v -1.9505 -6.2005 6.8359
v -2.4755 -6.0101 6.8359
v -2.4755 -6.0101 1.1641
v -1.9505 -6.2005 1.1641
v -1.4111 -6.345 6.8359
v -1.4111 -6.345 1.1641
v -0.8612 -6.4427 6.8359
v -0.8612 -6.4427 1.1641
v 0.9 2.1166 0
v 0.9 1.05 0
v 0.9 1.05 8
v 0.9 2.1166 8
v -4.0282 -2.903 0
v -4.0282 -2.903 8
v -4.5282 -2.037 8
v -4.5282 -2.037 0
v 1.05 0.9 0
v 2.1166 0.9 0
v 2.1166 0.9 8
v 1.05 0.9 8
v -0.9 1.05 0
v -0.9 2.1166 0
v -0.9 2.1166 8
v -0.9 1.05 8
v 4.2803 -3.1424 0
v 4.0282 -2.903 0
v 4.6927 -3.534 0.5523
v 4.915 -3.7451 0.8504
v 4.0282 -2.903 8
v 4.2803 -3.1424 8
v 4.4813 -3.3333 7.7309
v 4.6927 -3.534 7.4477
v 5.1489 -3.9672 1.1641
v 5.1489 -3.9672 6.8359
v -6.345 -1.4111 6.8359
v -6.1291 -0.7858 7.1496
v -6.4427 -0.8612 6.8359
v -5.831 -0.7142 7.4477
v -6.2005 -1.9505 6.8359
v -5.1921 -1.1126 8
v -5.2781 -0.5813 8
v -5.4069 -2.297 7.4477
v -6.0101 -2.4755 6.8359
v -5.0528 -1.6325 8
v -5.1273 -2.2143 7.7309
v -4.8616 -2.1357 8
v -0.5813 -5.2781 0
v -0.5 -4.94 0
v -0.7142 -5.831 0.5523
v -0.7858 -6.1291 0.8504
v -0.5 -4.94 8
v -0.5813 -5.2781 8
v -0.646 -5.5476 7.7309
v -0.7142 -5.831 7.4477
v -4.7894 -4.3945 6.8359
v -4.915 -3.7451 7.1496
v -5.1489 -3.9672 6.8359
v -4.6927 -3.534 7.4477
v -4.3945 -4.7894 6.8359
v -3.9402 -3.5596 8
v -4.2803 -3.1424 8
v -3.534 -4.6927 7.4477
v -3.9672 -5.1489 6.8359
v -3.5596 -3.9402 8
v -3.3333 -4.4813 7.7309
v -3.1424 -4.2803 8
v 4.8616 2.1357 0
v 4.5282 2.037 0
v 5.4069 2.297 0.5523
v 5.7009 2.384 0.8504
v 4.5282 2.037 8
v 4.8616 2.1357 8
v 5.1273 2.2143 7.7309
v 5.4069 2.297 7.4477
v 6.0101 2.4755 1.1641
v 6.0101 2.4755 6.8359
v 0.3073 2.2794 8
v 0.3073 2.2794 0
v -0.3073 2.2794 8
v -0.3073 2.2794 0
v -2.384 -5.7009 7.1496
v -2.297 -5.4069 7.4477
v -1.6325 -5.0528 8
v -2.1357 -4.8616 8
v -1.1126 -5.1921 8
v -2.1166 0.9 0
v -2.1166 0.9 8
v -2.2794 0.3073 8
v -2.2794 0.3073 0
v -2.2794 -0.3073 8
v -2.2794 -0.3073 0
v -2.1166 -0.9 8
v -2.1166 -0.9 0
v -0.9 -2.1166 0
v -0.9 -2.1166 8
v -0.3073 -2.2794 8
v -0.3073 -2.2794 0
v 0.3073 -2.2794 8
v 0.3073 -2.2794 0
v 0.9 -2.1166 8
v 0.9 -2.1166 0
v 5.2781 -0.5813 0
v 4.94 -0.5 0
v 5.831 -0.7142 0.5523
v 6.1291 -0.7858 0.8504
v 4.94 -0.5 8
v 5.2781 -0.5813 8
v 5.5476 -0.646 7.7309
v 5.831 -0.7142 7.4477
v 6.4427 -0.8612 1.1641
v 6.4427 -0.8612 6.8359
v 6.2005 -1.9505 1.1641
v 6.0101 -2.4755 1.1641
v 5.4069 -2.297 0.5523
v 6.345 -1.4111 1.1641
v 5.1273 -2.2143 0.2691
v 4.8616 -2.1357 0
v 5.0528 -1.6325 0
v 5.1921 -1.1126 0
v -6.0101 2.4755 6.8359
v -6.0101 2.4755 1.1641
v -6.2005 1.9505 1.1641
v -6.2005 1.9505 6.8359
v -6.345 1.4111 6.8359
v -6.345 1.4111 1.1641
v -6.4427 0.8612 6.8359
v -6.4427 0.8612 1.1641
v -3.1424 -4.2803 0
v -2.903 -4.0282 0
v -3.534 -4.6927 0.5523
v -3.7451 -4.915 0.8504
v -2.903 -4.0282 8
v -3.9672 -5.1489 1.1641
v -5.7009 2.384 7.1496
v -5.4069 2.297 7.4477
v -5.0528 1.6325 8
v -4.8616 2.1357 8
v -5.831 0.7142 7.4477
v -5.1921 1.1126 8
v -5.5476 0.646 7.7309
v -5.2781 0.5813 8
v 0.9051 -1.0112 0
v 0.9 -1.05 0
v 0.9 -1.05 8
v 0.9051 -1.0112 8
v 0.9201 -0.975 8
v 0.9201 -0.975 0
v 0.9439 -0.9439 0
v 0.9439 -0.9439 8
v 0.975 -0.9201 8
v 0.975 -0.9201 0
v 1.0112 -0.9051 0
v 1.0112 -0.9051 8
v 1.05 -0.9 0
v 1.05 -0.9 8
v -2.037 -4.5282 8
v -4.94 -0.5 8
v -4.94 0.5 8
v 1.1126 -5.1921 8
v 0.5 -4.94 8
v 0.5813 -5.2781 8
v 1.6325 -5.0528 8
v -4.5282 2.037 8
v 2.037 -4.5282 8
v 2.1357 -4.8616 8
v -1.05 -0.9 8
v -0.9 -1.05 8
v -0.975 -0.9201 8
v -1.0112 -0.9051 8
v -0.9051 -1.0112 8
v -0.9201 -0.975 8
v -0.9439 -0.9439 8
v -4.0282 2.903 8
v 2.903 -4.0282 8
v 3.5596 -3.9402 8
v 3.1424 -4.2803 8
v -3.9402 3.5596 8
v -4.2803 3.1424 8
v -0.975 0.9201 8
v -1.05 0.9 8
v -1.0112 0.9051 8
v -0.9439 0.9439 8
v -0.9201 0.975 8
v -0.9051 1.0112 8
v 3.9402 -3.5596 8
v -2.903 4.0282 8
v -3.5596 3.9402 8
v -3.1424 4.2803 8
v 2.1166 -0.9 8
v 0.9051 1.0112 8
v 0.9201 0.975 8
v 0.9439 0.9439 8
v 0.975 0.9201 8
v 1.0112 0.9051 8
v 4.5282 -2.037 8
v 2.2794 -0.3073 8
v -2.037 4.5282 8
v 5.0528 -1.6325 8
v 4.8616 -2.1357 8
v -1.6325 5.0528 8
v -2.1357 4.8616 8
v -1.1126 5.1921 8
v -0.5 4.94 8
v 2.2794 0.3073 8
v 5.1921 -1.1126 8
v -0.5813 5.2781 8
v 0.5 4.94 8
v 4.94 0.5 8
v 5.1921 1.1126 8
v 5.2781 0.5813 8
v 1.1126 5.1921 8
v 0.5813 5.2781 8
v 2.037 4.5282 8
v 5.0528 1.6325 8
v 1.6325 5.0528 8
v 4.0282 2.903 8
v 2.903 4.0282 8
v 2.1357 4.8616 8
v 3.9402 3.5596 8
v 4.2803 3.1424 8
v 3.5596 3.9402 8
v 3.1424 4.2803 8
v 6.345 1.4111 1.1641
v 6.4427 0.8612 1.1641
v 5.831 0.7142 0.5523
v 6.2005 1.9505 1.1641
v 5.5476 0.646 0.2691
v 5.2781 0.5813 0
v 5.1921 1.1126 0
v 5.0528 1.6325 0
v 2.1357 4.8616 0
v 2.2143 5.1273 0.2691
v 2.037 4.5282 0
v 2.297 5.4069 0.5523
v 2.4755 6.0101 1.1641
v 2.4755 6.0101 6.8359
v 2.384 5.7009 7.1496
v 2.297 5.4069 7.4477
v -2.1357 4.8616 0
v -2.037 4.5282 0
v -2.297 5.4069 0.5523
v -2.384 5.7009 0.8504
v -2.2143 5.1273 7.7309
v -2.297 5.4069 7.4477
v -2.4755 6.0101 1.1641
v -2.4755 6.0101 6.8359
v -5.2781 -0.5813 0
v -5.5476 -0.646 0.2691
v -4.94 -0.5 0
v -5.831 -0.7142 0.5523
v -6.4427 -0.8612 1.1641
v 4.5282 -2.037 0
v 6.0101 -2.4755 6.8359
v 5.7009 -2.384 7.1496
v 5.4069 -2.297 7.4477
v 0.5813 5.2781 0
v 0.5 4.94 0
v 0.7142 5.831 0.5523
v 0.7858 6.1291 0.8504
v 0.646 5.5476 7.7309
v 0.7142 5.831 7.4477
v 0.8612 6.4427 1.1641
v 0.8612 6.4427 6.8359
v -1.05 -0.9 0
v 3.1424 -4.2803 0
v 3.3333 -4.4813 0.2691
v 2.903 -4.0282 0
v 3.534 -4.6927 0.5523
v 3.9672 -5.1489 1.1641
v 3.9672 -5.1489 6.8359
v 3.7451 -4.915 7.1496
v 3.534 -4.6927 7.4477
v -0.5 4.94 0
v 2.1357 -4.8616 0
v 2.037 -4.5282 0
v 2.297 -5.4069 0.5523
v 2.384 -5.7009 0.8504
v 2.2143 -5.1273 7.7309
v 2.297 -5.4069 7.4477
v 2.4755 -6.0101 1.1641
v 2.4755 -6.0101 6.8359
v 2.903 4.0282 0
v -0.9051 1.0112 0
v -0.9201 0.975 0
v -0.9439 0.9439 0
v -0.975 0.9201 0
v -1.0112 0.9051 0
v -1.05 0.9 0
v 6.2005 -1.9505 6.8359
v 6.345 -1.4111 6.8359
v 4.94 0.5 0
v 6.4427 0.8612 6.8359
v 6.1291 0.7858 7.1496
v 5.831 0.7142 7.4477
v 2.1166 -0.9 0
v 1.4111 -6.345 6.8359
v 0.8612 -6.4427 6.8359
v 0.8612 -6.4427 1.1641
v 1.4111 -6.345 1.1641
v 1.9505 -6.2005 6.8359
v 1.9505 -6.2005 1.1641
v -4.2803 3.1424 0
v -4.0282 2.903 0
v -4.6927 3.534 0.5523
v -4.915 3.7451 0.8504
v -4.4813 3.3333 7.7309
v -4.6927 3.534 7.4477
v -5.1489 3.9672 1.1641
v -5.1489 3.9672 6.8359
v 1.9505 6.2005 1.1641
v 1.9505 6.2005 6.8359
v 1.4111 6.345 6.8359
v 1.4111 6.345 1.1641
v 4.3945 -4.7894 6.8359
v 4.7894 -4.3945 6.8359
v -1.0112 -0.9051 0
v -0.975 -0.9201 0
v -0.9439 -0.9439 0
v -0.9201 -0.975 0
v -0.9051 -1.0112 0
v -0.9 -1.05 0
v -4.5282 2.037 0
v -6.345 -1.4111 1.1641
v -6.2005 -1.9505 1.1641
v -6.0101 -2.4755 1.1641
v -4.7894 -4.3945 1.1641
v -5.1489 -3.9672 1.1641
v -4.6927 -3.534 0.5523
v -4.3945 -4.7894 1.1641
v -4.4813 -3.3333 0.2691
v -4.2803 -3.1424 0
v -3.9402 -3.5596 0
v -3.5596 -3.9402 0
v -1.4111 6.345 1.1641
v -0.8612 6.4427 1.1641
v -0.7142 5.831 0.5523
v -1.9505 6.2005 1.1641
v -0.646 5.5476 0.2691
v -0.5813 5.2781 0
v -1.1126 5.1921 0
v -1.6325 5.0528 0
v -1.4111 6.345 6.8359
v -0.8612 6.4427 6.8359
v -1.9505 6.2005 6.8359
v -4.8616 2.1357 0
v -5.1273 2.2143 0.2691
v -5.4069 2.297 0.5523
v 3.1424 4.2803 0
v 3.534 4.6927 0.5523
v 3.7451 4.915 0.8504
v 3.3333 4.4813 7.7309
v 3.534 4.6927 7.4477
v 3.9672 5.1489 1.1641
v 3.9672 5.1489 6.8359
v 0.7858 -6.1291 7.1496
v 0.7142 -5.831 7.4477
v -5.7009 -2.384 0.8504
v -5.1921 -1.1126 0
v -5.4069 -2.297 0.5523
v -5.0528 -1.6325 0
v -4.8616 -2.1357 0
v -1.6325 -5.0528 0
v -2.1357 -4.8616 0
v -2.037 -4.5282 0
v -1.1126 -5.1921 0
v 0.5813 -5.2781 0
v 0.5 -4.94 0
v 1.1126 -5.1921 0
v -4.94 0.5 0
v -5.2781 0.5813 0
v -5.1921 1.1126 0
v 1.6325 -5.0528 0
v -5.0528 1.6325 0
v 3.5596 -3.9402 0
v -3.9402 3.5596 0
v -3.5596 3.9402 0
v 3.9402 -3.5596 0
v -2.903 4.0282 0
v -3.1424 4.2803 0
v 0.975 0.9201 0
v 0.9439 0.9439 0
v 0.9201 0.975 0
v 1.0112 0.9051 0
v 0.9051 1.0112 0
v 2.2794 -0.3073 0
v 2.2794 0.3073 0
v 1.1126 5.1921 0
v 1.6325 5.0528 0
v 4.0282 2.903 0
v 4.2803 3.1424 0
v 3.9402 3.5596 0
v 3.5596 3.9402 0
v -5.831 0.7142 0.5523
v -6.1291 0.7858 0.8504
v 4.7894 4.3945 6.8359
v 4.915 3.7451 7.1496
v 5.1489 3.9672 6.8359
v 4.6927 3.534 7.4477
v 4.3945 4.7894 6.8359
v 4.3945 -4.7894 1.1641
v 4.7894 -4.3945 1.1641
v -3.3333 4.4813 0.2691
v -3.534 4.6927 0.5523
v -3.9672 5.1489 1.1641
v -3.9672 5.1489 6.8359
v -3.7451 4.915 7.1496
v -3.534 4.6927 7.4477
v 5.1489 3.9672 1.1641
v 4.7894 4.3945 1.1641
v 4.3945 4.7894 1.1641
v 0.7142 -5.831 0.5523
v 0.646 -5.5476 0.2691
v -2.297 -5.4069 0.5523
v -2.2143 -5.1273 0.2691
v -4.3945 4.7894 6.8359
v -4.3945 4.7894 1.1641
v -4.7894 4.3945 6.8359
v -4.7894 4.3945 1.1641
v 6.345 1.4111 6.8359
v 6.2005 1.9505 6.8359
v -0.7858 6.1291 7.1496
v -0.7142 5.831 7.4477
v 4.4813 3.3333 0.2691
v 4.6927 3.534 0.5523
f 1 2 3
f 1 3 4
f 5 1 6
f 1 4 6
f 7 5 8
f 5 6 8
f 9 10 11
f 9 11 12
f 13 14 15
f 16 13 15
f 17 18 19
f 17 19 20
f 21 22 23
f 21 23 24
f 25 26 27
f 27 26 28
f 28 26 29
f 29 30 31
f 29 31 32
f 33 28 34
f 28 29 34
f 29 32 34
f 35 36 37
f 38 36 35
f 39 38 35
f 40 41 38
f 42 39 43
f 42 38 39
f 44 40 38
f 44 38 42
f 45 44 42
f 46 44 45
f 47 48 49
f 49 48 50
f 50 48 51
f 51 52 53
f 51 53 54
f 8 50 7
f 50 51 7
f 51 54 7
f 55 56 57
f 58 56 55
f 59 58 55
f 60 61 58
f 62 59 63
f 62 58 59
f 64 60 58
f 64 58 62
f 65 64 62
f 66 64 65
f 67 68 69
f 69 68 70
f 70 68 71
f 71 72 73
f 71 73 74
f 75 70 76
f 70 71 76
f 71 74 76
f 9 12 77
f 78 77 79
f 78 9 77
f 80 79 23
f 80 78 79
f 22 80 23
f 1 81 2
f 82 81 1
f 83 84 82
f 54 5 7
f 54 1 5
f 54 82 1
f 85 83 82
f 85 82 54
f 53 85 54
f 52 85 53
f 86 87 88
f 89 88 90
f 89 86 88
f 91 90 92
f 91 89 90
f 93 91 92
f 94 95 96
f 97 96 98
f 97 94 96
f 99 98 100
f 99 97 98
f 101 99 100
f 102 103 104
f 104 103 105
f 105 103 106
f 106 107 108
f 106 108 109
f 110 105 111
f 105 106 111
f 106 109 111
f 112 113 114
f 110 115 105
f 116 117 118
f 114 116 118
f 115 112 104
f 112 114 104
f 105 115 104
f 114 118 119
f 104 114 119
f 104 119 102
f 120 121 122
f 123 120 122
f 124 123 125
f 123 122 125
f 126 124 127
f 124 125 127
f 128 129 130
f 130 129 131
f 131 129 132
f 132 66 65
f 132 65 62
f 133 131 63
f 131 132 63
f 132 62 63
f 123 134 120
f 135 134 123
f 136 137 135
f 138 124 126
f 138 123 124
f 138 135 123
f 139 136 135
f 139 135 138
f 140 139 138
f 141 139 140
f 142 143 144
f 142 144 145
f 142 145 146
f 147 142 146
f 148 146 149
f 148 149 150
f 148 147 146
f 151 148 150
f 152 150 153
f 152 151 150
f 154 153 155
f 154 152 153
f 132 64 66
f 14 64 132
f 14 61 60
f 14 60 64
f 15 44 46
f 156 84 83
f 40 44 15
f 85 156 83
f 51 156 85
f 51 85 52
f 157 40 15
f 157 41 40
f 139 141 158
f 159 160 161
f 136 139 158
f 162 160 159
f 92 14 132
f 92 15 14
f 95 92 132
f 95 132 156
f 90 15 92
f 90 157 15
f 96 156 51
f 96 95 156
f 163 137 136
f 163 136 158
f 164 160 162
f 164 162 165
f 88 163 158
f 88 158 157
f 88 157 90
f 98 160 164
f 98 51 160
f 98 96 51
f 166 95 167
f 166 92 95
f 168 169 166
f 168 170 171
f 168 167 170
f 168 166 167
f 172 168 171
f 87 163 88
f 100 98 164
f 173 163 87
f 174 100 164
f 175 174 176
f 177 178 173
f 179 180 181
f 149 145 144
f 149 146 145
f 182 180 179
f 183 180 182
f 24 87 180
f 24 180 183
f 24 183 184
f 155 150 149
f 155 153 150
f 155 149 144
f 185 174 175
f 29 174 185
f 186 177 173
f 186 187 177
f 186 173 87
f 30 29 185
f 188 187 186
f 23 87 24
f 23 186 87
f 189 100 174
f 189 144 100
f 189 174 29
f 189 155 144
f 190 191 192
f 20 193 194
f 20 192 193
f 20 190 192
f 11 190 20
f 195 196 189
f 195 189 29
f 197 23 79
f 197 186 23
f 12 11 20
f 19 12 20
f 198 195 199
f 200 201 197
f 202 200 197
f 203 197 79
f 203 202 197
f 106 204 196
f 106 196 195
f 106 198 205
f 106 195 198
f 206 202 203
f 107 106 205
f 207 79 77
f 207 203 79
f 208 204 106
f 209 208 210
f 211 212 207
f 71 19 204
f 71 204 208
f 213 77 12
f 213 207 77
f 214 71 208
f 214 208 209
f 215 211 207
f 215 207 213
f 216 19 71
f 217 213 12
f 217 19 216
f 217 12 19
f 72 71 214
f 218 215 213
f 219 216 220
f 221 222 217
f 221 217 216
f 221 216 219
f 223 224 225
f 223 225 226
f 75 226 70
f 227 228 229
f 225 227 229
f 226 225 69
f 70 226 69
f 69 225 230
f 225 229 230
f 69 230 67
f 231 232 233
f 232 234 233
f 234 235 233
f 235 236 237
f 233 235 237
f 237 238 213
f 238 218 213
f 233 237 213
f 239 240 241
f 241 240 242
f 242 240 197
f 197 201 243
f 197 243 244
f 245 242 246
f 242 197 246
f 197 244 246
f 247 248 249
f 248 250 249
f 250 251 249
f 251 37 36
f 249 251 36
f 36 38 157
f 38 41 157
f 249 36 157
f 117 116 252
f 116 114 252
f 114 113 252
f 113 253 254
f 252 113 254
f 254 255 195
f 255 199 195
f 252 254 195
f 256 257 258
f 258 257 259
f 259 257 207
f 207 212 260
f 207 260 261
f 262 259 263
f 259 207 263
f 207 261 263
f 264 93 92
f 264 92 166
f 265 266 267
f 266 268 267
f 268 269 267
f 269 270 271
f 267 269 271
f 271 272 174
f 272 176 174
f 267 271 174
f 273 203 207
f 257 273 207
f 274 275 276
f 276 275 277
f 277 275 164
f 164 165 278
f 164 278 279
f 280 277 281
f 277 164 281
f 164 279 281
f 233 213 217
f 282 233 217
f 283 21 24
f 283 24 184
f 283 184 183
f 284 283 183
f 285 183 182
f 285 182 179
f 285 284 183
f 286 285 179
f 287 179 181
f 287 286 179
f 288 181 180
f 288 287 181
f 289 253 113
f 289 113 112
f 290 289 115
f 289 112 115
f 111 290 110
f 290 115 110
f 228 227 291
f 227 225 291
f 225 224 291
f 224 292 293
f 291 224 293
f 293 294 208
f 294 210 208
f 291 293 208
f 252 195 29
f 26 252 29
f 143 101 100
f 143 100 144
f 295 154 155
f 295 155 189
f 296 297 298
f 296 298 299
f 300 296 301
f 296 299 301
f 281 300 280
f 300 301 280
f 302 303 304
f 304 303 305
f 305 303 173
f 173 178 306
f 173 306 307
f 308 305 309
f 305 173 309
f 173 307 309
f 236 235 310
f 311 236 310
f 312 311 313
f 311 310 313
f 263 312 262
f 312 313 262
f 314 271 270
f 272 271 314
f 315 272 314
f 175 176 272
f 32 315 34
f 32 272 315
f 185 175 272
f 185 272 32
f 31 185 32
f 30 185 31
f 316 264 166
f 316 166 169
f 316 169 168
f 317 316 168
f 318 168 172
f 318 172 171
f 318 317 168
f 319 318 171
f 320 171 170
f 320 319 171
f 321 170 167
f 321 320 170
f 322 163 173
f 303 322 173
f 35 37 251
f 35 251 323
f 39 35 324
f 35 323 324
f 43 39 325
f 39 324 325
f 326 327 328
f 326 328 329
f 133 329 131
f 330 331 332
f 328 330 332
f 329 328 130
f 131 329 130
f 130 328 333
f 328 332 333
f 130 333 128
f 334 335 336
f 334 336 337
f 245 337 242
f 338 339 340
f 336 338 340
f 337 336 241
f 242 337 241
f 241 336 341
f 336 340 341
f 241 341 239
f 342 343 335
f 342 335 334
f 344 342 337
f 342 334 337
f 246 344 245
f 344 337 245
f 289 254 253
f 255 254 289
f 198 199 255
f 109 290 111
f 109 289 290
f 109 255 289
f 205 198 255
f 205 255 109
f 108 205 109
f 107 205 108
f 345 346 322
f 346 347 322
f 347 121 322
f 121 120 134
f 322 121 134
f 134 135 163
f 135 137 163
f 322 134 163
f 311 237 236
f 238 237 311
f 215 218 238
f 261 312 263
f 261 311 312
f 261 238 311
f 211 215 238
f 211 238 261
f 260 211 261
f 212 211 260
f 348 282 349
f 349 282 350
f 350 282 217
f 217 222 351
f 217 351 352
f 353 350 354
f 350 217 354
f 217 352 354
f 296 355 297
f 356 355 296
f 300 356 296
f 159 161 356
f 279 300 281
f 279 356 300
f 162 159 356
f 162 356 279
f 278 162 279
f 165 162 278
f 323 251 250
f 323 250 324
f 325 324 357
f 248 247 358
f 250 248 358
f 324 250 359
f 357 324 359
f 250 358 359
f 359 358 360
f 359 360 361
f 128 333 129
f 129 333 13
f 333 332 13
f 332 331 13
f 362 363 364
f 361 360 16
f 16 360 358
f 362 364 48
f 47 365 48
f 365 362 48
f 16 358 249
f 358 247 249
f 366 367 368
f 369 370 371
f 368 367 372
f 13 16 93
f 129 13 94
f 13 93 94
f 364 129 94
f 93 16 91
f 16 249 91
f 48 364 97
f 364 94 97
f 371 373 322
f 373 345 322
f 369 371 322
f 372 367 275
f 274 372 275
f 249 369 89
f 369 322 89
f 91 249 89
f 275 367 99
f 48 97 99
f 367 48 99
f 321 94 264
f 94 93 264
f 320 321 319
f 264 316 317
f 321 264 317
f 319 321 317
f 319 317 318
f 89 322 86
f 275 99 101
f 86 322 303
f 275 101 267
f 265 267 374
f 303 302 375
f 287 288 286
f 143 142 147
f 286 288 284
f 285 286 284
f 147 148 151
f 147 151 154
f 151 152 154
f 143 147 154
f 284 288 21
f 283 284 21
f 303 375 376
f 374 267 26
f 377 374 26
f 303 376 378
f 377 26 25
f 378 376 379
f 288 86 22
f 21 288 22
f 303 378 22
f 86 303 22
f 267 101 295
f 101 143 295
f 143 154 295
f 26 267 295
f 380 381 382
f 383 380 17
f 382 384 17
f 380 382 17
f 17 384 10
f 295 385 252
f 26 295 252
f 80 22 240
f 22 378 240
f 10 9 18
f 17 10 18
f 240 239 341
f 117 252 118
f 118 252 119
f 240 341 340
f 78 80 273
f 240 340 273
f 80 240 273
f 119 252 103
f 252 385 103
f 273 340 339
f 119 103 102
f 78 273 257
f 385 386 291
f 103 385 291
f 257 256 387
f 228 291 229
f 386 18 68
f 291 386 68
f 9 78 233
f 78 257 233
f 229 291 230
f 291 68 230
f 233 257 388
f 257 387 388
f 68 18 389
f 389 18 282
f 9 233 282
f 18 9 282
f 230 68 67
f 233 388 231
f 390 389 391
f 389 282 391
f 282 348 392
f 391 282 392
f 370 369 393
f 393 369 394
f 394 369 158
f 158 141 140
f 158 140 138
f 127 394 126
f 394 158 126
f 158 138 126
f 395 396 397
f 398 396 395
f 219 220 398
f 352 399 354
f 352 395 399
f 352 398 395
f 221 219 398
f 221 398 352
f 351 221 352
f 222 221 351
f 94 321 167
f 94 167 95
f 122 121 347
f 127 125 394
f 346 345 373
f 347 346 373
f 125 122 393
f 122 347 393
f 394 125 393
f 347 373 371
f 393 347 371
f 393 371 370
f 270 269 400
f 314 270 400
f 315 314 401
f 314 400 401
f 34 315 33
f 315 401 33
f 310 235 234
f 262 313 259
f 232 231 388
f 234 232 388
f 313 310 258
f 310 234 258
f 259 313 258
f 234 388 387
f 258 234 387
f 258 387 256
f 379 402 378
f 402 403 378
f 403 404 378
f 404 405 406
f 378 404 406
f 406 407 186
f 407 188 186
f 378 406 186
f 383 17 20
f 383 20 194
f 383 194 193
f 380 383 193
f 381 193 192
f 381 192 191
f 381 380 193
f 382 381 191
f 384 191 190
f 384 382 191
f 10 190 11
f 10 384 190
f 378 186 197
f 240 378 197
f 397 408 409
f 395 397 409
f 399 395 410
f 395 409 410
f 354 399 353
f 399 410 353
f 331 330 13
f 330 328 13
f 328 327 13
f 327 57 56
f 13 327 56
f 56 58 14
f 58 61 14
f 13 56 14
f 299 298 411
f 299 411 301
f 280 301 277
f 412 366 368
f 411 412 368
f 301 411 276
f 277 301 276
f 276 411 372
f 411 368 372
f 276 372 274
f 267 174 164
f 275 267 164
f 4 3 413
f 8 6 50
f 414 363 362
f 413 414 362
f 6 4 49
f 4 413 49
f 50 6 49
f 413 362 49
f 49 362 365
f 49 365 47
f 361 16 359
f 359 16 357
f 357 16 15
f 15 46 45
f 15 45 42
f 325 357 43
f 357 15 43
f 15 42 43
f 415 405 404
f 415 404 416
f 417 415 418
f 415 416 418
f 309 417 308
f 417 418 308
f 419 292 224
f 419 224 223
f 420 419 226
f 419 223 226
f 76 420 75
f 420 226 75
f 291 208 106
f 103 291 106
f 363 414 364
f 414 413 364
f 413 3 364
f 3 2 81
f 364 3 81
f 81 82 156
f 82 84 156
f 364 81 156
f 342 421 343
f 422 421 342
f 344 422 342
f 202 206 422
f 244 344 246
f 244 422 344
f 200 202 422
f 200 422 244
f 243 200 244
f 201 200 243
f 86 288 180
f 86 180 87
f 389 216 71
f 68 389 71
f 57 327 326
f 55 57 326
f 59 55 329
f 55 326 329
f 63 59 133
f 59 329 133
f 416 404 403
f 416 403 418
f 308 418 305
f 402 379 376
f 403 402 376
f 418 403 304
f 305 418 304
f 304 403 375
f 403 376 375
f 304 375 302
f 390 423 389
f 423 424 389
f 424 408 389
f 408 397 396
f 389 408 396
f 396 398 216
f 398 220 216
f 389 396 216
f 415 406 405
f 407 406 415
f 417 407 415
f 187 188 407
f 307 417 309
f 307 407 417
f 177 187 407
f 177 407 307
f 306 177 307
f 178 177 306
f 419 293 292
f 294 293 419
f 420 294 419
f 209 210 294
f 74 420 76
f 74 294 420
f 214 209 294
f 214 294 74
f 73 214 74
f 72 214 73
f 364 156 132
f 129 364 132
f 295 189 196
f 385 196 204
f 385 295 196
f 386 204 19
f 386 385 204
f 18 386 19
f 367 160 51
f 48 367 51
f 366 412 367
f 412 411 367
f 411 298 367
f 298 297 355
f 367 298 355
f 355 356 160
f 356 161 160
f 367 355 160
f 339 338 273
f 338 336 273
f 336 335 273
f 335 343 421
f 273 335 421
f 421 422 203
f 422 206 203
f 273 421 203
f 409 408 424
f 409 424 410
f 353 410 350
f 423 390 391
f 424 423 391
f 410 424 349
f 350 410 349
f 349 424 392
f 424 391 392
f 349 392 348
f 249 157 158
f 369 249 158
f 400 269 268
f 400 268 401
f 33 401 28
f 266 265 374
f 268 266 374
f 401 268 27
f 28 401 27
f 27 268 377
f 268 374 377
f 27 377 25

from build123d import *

# Parameters (mm, degrees)
SKETCH2_R           = 6.5
BOSS_EXTRUDE1_DEPTH = 8
CUT_EXTRUDE1_DEPTH  = 13.186057607
CIRPATTERN1_COUNT   = 12


with BuildPart() as part:
    # Sketch2 → Boss-Extrude1 (new body)
    with BuildSketch(Plane.XY):
        Circle(SKETCH2_R)
        with BuildLine():
            Line((-0.9, 2.116601049), (-0.9, 1.05))
            ThreePointArc((-0.9, 1.05), (-0.943933983, 0.943933983), (-1.05, 0.9))
            Line((-1.05, 0.9), (-2.116601049, 0.9))
            ThreePointArc((-2.116601049, 0.9), (-2.3, 0), (-2.116601049, -0.9))
            Line((-2.116601049, -0.9), (-1.05, -0.9))
            ThreePointArc((-1.05, -0.9), (-0.943933983, -0.943933983), (-0.9, -1.05))
            Line((-0.9, -1.05), (-0.9, -2.116601049))
            ThreePointArc((-0.9, -2.116601049), (0, -2.3), (0.9, -2.116601049))
            Line((0.9, -2.116601049), (0.9, -1.05))
            ThreePointArc((0.9, -1.05), (0.943933983, -0.943933983), (1.05, -0.9))
            Line((1.05, -0.9), (2.116601049, -0.9))
            ThreePointArc((2.116601049, -0.9), (2.3, 0), (2.116601049, 0.9))
            Line((2.116601049, 0.9), (1.05, 0.9))
            ThreePointArc((1.05, 0.9), (0.943933983, 0.943933983), (0.9, 1.05))
            Line((0.9, 1.05), (0.9, 2.116601049))
            ThreePointArc((0.9, 2.116601049), (0, 2.3), (-0.9, 2.116601049))
        make_face(mode=Mode.SUBTRACT)
    extrude(amount=BOSS_EXTRUDE1_DEPTH)

    # Sketch3 → Cut-Extrude1 (cut, through all)
    with BuildSketch(Plane.XY.offset(8)):
        Polygon((-0.875, 6.5), (-0.5, 4.94), (0, 4.94), (0.5, 4.94), (0.875, 6.5), align=None)
    cut_extrude1 = extrude(amount=-CUT_EXTRUDE1_DEPTH, mode=Mode.SUBTRACT)

    # CirPattern1: Cut-Extrude1 ×12 about axis
    cirpattern1_axis = Axis((0, 0, 0), (0, 0, 1))
    for i in range(1, CIRPATTERN1_COUNT):
        add(cut_extrude1.rotate(cirpattern1_axis, i * 360 / CIRPATTERN1_COUNT), mode=Mode.SUBTRACT)

    # Sketch4 → Cut-Revolve1 (revolve, cut)
    with BuildSketch(Plane(origin=(0, 0, 0), x_dir=(1, 0, 0), z_dir=(0, 1, 0))):
        Polygon((-6.812692974, -8.45), (-6.812692974, -6.53), (-4.85, -8.45), align=None)
        Polygon((-4.85, 0.45), (-6.812692974, 0.45), (-6.812692974, -1.47), align=None)
    revolve(axis=Axis((0, 0, -4.663745267), (0, 0, 1)), mode=Mode.SUBTRACT)


solid = part.part
